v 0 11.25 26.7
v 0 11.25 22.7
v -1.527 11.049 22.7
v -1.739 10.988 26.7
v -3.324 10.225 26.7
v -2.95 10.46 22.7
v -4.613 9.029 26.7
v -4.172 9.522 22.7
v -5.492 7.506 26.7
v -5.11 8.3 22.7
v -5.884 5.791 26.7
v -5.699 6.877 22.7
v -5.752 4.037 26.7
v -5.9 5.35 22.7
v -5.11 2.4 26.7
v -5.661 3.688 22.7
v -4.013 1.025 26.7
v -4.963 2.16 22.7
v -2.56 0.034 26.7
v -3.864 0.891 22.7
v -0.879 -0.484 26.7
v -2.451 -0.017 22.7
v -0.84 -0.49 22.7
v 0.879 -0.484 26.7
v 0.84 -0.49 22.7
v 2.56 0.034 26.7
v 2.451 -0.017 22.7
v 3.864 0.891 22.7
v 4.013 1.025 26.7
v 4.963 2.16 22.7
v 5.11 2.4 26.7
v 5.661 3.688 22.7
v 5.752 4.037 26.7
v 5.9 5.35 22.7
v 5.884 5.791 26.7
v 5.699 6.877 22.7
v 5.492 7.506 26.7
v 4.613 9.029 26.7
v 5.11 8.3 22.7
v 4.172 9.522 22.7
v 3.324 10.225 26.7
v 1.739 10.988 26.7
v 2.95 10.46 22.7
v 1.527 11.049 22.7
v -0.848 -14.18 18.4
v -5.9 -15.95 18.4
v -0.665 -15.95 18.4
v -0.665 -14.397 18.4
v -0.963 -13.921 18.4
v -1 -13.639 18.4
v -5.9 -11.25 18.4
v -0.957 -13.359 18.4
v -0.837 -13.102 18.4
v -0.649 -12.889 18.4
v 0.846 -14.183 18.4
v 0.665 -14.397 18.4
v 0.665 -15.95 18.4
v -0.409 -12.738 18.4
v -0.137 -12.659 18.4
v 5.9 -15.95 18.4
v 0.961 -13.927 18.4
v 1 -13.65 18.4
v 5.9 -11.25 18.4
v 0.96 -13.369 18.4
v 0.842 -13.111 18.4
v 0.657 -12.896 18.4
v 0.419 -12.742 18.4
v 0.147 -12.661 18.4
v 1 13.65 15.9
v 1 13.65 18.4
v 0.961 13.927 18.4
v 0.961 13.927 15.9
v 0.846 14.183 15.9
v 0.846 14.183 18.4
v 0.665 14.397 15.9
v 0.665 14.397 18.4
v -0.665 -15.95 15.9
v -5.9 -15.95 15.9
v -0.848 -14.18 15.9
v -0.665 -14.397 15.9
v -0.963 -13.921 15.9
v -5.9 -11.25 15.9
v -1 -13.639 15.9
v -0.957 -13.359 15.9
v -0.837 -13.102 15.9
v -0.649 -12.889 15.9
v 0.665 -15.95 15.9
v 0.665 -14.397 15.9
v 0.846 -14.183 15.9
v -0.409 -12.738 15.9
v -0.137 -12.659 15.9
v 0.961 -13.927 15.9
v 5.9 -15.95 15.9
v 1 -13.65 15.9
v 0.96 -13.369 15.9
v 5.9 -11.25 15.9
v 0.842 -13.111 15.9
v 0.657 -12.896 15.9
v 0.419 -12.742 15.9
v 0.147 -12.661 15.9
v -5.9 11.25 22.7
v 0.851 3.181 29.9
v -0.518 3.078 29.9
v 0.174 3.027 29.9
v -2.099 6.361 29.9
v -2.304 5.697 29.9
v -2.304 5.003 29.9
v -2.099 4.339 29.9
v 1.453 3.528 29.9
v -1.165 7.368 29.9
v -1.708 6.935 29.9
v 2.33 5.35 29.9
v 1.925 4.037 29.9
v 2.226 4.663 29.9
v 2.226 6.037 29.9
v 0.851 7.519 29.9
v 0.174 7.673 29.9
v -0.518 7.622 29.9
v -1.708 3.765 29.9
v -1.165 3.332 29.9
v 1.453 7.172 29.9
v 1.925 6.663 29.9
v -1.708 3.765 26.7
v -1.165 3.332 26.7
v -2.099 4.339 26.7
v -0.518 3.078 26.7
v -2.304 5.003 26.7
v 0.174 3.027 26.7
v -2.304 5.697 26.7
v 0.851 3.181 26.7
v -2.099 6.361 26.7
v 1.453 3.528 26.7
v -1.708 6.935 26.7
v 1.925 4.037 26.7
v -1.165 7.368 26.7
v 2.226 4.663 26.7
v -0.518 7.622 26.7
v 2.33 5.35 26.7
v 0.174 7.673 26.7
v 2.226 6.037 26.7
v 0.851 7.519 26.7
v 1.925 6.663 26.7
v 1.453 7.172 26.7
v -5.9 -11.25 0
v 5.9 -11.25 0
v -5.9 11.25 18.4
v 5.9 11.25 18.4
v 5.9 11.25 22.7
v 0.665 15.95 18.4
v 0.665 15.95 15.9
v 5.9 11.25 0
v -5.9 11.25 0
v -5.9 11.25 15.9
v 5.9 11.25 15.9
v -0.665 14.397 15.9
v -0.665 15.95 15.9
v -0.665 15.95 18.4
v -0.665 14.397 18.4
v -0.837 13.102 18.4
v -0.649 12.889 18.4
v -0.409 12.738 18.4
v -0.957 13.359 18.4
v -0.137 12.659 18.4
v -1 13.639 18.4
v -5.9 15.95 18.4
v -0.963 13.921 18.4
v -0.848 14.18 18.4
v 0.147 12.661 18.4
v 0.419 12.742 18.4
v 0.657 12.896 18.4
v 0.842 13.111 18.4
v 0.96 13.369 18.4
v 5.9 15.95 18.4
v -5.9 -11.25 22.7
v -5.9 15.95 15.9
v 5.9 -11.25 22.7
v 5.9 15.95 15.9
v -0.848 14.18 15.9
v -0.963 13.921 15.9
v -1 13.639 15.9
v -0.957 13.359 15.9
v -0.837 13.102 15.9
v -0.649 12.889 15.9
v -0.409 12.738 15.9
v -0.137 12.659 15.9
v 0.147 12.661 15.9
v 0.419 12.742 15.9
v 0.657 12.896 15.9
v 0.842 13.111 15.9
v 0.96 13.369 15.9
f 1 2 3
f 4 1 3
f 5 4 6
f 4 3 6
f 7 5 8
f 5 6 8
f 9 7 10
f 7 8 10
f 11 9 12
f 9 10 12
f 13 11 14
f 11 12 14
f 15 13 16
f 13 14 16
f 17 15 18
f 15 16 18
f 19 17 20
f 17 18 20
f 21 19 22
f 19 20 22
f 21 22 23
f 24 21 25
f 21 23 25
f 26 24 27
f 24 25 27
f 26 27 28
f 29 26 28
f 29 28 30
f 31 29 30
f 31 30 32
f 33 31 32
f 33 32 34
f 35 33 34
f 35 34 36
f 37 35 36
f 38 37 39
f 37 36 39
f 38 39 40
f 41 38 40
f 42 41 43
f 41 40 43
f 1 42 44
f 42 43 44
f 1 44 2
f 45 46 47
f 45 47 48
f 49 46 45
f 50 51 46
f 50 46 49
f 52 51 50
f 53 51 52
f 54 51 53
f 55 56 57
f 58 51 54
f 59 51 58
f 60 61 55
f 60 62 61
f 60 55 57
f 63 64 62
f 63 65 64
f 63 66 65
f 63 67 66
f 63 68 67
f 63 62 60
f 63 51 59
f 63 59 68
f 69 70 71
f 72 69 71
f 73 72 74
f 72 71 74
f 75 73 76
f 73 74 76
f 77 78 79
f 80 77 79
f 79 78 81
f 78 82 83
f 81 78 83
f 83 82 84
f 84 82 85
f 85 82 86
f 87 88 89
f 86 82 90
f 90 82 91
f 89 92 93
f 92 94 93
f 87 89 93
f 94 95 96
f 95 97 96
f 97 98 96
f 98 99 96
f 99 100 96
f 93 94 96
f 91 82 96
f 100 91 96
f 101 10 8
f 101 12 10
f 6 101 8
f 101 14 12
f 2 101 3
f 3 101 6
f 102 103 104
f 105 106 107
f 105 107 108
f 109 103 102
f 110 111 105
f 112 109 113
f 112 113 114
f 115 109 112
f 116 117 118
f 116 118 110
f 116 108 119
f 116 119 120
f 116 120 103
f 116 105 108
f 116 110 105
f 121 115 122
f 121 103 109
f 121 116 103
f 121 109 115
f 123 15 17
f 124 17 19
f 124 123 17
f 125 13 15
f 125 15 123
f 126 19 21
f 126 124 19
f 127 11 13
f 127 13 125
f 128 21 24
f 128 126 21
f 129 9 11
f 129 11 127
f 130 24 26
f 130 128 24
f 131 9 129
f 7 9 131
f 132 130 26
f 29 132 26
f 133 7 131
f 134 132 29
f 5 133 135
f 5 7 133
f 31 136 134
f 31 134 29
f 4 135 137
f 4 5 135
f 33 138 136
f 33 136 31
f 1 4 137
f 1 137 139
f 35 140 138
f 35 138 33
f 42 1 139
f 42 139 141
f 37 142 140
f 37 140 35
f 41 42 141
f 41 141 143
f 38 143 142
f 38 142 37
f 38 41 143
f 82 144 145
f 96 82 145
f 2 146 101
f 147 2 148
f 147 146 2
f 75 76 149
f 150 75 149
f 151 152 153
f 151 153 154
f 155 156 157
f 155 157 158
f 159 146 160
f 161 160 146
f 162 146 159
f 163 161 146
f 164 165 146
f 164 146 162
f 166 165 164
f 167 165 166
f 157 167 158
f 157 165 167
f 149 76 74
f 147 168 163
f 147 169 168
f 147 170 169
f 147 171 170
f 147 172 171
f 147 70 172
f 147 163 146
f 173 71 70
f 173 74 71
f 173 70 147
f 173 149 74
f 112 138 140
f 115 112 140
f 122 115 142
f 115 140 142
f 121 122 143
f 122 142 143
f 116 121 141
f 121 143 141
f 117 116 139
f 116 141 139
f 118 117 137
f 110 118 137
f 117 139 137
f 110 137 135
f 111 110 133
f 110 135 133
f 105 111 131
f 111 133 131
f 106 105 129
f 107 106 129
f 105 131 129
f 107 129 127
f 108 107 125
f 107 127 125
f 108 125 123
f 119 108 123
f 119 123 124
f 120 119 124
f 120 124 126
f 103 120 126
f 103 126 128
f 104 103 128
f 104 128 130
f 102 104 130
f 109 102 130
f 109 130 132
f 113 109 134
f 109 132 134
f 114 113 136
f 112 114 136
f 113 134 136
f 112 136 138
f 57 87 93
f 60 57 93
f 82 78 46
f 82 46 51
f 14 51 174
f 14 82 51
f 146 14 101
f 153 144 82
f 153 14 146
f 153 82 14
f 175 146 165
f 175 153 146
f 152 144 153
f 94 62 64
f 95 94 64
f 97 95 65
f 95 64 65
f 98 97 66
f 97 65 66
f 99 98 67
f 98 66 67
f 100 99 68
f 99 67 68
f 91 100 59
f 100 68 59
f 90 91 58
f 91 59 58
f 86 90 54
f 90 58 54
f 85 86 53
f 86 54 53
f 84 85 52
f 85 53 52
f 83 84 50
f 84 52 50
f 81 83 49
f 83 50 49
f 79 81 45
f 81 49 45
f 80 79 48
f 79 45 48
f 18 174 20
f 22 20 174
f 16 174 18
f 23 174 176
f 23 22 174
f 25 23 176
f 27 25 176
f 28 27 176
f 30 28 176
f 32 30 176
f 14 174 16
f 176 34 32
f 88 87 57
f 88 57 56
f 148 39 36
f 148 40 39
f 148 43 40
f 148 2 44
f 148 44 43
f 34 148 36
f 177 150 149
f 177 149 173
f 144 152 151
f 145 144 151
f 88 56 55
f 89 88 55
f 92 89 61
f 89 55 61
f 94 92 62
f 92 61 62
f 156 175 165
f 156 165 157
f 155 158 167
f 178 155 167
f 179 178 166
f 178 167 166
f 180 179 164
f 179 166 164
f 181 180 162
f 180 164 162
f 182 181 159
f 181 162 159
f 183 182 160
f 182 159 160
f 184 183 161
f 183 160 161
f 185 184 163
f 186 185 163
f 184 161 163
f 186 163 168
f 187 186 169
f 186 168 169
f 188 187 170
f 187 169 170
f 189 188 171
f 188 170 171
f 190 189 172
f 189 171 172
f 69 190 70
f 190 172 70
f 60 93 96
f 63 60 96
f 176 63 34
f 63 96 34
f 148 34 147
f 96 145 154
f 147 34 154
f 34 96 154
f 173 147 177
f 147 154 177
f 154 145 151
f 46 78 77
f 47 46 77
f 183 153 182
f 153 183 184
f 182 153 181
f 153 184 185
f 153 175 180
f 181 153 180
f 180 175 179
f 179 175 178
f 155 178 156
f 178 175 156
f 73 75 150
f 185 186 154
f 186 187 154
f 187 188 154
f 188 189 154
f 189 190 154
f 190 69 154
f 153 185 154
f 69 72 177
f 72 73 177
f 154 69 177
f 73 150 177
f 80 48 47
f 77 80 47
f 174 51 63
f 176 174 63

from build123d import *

# Parameters (mm, degrees)
F0_W      = 11.8
F0_H      = 22.5
F1_DEPTH  = 15.9
F2_W      = 11.8
F2_H      = 31.9
F3_DEPTH  = 2.5
F5_DEPTH  = 2.5
F6_DEPTH  = 22.7
F8_DEPTH  = 4
F9_R      = 2.33
F10_DEPTH = 3.2


with BuildPart() as f1:
    # F0 (on Top) → F1 (new body)
    with BuildSketch(Plane.XY):
        Rectangle(F0_W, F0_H)
    extrude(amount=F1_DEPTH)

    # F2 (on face) → F3 (join)
    with BuildSketch(Plane.XY.offset(15.9)):
        Rectangle(F2_W, F2_H)
    extrude(amount=F3_DEPTH)

    # F4 (on face) → F5 (cut)
    with BuildSketch(Plane.XY.offset(18.4)):
        with BuildLine():
            ThreePointArc((-0.665, 14.3968433571), (-0.4092676386, 12.7375856205), (1, 13.65))
            ThreePointArc((1, 13.65), (0.9124143795, 14.0592676386), (0.665, 14.3968433571))
            Line((0.665, 14.3968433571), (0.665, 13.65))
            Line((0.665, 13.65), (-0.665, 13.65))
            Line((-0.665, 13.65), (-0.665, 14.3968433571))
        make_face()
        with BuildLine():
            Line((0.665, 13.65), (0.665, 14.3968433571))
            ThreePointArc((0.665, 14.3968433571), (0, 14.65), (-0.665, 14.3968433571))
            Line((-0.665, 14.3968433571), (-0.665, 13.65))
            Line((-0.665, 13.65), (0.665, 13.65))
        make_face()
        with BuildLine():
            ThreePointArc((-0.665, 14.3968433571), (0, 14.65), (0.665, 14.3968433571))
            Line((0.665, 14.3968433571), (0.665, 15.95))
            Line((0.665, 15.95), (-0.665, 15.95))
            Line((-0.665, 15.95), (-0.665, 14.3968433571))
        make_face()
        with BuildLine():
            ThreePointArc((0.665, -14.3968433571), (0.9124143795, -14.0592676386), (1, -13.65))
            ThreePointArc((1, -13.65), (-0.4092676386, -12.7375856205), (-0.665, -14.3968433571))
            Line((-0.665, -14.3968433571), (-0.665, -13.65))
            Line((-0.665, -13.65), (0.665, -13.65))
            Line((0.665, -13.65), (0.665, -14.3968433571))
        make_face()
        with BuildLine():
            Line((-0.665, -13.65), (-0.665, -14.3968433571))
            ThreePointArc((-0.665, -14.3968433571), (0, -14.65), (0.665, -14.3968433571))
            Line((0.665, -14.3968433571), (0.665, -13.65))
            Line((0.665, -13.65), (-0.665, -13.65))
        make_face()
        with BuildLine():
            ThreePointArc((0.665, -14.3968433571), (0, -14.65), (-0.665, -14.3968433571))
            Line((-0.665, -14.3968433571), (-0.665, -15.95))
            Line((-0.665, -15.95), (0.665, -15.95))
            Line((0.665, -15.95), (0.665, -14.3968433571))
        make_face()
    extrude(amount=-F5_DEPTH, mode=Mode.SUBTRACT)

    # F0 (on Top) → F6 (join)
    with BuildSketch(Plane.XY):
        Rectangle(F0_W, F0_H)
    extrude(amount=F6_DEPTH)

    # F7 (on face) → F8 (join)
    with BuildSketch(Plane.XY.offset(22.7)):
        with BuildLine():
            ThreePointArc((-5.9, 5.35), (0, -0.55), (5.9, 5.35))
            ThreePointArc((5.9, 5.35), (4.171930009, 9.521930009), (0, 11.25))
            ThreePointArc((0, 11.25), (-4.171930009, 9.521930009), (-5.9, 5.35))
        make_face()
    extrude(amount=F8_DEPTH)

    # F9 (on face) → F10 (join)
    with BuildSketch(Plane.XY.offset(26.7)):
        with Locations((0, 5.35)):
            Circle(F9_R)
    extrude(amount=F10_DEPTH)


solid = f1.part
